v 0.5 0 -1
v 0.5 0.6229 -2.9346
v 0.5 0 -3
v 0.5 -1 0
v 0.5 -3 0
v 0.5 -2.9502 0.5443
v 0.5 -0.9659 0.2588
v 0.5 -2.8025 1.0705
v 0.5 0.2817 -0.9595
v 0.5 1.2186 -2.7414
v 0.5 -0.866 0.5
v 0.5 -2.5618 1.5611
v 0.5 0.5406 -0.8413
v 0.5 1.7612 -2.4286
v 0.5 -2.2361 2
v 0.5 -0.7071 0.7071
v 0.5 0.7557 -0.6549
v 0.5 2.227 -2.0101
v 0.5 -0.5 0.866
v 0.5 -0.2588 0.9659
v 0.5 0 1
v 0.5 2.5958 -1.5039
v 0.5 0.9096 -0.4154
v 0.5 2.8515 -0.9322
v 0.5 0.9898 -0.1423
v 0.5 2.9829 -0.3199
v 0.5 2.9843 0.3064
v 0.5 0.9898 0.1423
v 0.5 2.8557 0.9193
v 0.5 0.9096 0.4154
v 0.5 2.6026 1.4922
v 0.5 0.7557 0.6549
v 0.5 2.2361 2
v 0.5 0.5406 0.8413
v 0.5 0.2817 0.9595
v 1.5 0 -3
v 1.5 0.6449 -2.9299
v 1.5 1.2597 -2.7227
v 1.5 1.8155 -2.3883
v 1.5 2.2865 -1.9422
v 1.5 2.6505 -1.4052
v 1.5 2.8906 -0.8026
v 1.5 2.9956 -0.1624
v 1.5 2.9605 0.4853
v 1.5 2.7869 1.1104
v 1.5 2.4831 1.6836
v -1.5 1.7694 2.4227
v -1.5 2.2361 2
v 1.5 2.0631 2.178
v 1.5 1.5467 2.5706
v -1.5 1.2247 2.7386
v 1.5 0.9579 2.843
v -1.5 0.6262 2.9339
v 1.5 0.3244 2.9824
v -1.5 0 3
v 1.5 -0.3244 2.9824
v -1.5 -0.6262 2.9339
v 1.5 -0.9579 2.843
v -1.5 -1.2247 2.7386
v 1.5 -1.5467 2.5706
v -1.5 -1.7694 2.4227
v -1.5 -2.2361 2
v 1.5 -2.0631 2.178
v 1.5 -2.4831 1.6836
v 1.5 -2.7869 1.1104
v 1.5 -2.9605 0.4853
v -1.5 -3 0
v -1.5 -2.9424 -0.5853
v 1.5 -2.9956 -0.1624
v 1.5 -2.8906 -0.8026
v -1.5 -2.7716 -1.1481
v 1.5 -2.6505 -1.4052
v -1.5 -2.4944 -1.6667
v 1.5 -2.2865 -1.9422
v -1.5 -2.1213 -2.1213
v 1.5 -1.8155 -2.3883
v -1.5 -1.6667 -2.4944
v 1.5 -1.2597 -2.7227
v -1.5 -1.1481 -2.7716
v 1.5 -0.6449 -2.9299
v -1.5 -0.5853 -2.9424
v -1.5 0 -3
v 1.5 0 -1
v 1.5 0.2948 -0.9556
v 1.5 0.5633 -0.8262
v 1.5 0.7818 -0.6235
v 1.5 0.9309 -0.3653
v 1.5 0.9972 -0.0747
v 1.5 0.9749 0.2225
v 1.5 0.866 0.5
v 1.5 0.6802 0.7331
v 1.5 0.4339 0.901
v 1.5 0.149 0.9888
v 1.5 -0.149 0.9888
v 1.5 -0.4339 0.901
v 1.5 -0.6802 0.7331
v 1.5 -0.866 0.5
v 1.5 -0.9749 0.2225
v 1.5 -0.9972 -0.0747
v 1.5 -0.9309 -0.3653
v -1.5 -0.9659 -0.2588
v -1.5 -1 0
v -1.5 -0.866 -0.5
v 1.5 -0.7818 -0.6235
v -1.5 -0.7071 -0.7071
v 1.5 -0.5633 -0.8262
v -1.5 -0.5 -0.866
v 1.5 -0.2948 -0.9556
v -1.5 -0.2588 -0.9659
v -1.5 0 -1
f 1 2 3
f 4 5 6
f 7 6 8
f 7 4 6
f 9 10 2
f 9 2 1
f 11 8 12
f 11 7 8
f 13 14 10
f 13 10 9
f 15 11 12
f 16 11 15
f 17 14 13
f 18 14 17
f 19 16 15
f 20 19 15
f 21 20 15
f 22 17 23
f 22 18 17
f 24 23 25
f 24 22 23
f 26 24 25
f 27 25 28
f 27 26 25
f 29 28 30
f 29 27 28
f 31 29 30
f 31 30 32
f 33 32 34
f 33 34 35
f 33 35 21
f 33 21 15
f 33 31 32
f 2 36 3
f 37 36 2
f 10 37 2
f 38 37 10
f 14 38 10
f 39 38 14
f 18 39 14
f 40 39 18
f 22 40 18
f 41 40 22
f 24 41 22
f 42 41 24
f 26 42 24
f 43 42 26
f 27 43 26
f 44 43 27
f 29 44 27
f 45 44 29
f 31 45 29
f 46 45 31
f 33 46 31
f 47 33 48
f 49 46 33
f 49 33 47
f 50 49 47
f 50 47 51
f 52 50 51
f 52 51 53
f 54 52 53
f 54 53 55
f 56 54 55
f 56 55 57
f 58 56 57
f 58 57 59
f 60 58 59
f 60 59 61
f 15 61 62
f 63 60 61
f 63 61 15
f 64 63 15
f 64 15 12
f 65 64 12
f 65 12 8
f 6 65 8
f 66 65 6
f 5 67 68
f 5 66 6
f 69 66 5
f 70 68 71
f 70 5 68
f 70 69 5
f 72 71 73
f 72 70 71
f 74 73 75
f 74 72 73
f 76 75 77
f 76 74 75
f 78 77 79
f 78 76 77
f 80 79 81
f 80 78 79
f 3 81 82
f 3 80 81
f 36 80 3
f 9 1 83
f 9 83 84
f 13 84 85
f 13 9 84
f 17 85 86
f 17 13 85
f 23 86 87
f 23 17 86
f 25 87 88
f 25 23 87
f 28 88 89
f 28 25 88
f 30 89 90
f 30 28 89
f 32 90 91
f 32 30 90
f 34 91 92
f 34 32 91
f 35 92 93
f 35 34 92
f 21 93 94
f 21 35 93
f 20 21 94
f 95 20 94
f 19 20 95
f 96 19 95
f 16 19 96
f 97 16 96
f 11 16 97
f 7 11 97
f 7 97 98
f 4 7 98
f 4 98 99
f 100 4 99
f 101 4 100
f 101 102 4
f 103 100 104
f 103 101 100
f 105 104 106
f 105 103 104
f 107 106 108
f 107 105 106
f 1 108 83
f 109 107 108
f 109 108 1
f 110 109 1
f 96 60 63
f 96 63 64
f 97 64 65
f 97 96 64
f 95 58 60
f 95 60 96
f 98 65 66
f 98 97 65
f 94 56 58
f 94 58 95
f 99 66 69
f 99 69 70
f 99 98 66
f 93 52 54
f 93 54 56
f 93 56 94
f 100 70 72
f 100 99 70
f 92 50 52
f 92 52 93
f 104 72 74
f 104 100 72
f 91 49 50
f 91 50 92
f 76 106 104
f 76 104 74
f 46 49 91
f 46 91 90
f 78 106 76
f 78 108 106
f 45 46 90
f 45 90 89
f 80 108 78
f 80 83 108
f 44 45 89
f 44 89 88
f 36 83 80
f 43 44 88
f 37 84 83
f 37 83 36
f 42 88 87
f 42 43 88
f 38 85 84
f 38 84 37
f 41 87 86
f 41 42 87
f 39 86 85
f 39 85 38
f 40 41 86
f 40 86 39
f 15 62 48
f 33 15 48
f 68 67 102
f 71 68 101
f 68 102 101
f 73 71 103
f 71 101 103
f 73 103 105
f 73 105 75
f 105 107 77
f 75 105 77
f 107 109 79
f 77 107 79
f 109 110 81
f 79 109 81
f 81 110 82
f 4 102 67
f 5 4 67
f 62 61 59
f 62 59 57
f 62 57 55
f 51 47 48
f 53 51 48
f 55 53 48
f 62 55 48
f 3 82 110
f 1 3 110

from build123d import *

# Parameters (mm, degrees)
SKETCH1_R           = 3
SKETCH1_R_2         = 1
BOSS_EXTRUDE1_DEPTH = 1.5
CUT_EXTRUDE1_DEPTH  = 2


with BuildPart() as part:
    # Sketch1 → Boss-Extrude1 (new body, symmetric)
    with BuildSketch(Plane(origin=(0, 0, 0), x_dir=(0, 0, -1), z_dir=(1, 0, 0))):
        Circle(SKETCH1_R)
        Circle(SKETCH1_R_2, mode=Mode.SUBTRACT)
    extrude(amount=BOSS_EXTRUDE1_DEPTH, both=True)

    # Sketch2 → Cut-Extrude1 (cut)
    with BuildSketch(Plane.ZY.offset(1.5)):
        with BuildLine():
            Line((2, -2.236067977), (2, 2.236067977))
            ThreePointArc((2, 2.236067977), (-1.224744871, 2.738612788), (-3, 0))
            Line((-3, 0), (-1, 0))
            ThreePointArc((-1, 0), (0, 1), (1, 0))
            ThreePointArc((1, 0), (0.707106781, -0.707106781), (0, -1))
            Line((0, -1), (0, -3))
            ThreePointArc((0, -3), (1.070466269, -2.802517077), (2, -2.236067977))
        make_face()
    extrude(amount=-CUT_EXTRUDE1_DEPTH, mode=Mode.SUBTRACT)


solid = part.part
